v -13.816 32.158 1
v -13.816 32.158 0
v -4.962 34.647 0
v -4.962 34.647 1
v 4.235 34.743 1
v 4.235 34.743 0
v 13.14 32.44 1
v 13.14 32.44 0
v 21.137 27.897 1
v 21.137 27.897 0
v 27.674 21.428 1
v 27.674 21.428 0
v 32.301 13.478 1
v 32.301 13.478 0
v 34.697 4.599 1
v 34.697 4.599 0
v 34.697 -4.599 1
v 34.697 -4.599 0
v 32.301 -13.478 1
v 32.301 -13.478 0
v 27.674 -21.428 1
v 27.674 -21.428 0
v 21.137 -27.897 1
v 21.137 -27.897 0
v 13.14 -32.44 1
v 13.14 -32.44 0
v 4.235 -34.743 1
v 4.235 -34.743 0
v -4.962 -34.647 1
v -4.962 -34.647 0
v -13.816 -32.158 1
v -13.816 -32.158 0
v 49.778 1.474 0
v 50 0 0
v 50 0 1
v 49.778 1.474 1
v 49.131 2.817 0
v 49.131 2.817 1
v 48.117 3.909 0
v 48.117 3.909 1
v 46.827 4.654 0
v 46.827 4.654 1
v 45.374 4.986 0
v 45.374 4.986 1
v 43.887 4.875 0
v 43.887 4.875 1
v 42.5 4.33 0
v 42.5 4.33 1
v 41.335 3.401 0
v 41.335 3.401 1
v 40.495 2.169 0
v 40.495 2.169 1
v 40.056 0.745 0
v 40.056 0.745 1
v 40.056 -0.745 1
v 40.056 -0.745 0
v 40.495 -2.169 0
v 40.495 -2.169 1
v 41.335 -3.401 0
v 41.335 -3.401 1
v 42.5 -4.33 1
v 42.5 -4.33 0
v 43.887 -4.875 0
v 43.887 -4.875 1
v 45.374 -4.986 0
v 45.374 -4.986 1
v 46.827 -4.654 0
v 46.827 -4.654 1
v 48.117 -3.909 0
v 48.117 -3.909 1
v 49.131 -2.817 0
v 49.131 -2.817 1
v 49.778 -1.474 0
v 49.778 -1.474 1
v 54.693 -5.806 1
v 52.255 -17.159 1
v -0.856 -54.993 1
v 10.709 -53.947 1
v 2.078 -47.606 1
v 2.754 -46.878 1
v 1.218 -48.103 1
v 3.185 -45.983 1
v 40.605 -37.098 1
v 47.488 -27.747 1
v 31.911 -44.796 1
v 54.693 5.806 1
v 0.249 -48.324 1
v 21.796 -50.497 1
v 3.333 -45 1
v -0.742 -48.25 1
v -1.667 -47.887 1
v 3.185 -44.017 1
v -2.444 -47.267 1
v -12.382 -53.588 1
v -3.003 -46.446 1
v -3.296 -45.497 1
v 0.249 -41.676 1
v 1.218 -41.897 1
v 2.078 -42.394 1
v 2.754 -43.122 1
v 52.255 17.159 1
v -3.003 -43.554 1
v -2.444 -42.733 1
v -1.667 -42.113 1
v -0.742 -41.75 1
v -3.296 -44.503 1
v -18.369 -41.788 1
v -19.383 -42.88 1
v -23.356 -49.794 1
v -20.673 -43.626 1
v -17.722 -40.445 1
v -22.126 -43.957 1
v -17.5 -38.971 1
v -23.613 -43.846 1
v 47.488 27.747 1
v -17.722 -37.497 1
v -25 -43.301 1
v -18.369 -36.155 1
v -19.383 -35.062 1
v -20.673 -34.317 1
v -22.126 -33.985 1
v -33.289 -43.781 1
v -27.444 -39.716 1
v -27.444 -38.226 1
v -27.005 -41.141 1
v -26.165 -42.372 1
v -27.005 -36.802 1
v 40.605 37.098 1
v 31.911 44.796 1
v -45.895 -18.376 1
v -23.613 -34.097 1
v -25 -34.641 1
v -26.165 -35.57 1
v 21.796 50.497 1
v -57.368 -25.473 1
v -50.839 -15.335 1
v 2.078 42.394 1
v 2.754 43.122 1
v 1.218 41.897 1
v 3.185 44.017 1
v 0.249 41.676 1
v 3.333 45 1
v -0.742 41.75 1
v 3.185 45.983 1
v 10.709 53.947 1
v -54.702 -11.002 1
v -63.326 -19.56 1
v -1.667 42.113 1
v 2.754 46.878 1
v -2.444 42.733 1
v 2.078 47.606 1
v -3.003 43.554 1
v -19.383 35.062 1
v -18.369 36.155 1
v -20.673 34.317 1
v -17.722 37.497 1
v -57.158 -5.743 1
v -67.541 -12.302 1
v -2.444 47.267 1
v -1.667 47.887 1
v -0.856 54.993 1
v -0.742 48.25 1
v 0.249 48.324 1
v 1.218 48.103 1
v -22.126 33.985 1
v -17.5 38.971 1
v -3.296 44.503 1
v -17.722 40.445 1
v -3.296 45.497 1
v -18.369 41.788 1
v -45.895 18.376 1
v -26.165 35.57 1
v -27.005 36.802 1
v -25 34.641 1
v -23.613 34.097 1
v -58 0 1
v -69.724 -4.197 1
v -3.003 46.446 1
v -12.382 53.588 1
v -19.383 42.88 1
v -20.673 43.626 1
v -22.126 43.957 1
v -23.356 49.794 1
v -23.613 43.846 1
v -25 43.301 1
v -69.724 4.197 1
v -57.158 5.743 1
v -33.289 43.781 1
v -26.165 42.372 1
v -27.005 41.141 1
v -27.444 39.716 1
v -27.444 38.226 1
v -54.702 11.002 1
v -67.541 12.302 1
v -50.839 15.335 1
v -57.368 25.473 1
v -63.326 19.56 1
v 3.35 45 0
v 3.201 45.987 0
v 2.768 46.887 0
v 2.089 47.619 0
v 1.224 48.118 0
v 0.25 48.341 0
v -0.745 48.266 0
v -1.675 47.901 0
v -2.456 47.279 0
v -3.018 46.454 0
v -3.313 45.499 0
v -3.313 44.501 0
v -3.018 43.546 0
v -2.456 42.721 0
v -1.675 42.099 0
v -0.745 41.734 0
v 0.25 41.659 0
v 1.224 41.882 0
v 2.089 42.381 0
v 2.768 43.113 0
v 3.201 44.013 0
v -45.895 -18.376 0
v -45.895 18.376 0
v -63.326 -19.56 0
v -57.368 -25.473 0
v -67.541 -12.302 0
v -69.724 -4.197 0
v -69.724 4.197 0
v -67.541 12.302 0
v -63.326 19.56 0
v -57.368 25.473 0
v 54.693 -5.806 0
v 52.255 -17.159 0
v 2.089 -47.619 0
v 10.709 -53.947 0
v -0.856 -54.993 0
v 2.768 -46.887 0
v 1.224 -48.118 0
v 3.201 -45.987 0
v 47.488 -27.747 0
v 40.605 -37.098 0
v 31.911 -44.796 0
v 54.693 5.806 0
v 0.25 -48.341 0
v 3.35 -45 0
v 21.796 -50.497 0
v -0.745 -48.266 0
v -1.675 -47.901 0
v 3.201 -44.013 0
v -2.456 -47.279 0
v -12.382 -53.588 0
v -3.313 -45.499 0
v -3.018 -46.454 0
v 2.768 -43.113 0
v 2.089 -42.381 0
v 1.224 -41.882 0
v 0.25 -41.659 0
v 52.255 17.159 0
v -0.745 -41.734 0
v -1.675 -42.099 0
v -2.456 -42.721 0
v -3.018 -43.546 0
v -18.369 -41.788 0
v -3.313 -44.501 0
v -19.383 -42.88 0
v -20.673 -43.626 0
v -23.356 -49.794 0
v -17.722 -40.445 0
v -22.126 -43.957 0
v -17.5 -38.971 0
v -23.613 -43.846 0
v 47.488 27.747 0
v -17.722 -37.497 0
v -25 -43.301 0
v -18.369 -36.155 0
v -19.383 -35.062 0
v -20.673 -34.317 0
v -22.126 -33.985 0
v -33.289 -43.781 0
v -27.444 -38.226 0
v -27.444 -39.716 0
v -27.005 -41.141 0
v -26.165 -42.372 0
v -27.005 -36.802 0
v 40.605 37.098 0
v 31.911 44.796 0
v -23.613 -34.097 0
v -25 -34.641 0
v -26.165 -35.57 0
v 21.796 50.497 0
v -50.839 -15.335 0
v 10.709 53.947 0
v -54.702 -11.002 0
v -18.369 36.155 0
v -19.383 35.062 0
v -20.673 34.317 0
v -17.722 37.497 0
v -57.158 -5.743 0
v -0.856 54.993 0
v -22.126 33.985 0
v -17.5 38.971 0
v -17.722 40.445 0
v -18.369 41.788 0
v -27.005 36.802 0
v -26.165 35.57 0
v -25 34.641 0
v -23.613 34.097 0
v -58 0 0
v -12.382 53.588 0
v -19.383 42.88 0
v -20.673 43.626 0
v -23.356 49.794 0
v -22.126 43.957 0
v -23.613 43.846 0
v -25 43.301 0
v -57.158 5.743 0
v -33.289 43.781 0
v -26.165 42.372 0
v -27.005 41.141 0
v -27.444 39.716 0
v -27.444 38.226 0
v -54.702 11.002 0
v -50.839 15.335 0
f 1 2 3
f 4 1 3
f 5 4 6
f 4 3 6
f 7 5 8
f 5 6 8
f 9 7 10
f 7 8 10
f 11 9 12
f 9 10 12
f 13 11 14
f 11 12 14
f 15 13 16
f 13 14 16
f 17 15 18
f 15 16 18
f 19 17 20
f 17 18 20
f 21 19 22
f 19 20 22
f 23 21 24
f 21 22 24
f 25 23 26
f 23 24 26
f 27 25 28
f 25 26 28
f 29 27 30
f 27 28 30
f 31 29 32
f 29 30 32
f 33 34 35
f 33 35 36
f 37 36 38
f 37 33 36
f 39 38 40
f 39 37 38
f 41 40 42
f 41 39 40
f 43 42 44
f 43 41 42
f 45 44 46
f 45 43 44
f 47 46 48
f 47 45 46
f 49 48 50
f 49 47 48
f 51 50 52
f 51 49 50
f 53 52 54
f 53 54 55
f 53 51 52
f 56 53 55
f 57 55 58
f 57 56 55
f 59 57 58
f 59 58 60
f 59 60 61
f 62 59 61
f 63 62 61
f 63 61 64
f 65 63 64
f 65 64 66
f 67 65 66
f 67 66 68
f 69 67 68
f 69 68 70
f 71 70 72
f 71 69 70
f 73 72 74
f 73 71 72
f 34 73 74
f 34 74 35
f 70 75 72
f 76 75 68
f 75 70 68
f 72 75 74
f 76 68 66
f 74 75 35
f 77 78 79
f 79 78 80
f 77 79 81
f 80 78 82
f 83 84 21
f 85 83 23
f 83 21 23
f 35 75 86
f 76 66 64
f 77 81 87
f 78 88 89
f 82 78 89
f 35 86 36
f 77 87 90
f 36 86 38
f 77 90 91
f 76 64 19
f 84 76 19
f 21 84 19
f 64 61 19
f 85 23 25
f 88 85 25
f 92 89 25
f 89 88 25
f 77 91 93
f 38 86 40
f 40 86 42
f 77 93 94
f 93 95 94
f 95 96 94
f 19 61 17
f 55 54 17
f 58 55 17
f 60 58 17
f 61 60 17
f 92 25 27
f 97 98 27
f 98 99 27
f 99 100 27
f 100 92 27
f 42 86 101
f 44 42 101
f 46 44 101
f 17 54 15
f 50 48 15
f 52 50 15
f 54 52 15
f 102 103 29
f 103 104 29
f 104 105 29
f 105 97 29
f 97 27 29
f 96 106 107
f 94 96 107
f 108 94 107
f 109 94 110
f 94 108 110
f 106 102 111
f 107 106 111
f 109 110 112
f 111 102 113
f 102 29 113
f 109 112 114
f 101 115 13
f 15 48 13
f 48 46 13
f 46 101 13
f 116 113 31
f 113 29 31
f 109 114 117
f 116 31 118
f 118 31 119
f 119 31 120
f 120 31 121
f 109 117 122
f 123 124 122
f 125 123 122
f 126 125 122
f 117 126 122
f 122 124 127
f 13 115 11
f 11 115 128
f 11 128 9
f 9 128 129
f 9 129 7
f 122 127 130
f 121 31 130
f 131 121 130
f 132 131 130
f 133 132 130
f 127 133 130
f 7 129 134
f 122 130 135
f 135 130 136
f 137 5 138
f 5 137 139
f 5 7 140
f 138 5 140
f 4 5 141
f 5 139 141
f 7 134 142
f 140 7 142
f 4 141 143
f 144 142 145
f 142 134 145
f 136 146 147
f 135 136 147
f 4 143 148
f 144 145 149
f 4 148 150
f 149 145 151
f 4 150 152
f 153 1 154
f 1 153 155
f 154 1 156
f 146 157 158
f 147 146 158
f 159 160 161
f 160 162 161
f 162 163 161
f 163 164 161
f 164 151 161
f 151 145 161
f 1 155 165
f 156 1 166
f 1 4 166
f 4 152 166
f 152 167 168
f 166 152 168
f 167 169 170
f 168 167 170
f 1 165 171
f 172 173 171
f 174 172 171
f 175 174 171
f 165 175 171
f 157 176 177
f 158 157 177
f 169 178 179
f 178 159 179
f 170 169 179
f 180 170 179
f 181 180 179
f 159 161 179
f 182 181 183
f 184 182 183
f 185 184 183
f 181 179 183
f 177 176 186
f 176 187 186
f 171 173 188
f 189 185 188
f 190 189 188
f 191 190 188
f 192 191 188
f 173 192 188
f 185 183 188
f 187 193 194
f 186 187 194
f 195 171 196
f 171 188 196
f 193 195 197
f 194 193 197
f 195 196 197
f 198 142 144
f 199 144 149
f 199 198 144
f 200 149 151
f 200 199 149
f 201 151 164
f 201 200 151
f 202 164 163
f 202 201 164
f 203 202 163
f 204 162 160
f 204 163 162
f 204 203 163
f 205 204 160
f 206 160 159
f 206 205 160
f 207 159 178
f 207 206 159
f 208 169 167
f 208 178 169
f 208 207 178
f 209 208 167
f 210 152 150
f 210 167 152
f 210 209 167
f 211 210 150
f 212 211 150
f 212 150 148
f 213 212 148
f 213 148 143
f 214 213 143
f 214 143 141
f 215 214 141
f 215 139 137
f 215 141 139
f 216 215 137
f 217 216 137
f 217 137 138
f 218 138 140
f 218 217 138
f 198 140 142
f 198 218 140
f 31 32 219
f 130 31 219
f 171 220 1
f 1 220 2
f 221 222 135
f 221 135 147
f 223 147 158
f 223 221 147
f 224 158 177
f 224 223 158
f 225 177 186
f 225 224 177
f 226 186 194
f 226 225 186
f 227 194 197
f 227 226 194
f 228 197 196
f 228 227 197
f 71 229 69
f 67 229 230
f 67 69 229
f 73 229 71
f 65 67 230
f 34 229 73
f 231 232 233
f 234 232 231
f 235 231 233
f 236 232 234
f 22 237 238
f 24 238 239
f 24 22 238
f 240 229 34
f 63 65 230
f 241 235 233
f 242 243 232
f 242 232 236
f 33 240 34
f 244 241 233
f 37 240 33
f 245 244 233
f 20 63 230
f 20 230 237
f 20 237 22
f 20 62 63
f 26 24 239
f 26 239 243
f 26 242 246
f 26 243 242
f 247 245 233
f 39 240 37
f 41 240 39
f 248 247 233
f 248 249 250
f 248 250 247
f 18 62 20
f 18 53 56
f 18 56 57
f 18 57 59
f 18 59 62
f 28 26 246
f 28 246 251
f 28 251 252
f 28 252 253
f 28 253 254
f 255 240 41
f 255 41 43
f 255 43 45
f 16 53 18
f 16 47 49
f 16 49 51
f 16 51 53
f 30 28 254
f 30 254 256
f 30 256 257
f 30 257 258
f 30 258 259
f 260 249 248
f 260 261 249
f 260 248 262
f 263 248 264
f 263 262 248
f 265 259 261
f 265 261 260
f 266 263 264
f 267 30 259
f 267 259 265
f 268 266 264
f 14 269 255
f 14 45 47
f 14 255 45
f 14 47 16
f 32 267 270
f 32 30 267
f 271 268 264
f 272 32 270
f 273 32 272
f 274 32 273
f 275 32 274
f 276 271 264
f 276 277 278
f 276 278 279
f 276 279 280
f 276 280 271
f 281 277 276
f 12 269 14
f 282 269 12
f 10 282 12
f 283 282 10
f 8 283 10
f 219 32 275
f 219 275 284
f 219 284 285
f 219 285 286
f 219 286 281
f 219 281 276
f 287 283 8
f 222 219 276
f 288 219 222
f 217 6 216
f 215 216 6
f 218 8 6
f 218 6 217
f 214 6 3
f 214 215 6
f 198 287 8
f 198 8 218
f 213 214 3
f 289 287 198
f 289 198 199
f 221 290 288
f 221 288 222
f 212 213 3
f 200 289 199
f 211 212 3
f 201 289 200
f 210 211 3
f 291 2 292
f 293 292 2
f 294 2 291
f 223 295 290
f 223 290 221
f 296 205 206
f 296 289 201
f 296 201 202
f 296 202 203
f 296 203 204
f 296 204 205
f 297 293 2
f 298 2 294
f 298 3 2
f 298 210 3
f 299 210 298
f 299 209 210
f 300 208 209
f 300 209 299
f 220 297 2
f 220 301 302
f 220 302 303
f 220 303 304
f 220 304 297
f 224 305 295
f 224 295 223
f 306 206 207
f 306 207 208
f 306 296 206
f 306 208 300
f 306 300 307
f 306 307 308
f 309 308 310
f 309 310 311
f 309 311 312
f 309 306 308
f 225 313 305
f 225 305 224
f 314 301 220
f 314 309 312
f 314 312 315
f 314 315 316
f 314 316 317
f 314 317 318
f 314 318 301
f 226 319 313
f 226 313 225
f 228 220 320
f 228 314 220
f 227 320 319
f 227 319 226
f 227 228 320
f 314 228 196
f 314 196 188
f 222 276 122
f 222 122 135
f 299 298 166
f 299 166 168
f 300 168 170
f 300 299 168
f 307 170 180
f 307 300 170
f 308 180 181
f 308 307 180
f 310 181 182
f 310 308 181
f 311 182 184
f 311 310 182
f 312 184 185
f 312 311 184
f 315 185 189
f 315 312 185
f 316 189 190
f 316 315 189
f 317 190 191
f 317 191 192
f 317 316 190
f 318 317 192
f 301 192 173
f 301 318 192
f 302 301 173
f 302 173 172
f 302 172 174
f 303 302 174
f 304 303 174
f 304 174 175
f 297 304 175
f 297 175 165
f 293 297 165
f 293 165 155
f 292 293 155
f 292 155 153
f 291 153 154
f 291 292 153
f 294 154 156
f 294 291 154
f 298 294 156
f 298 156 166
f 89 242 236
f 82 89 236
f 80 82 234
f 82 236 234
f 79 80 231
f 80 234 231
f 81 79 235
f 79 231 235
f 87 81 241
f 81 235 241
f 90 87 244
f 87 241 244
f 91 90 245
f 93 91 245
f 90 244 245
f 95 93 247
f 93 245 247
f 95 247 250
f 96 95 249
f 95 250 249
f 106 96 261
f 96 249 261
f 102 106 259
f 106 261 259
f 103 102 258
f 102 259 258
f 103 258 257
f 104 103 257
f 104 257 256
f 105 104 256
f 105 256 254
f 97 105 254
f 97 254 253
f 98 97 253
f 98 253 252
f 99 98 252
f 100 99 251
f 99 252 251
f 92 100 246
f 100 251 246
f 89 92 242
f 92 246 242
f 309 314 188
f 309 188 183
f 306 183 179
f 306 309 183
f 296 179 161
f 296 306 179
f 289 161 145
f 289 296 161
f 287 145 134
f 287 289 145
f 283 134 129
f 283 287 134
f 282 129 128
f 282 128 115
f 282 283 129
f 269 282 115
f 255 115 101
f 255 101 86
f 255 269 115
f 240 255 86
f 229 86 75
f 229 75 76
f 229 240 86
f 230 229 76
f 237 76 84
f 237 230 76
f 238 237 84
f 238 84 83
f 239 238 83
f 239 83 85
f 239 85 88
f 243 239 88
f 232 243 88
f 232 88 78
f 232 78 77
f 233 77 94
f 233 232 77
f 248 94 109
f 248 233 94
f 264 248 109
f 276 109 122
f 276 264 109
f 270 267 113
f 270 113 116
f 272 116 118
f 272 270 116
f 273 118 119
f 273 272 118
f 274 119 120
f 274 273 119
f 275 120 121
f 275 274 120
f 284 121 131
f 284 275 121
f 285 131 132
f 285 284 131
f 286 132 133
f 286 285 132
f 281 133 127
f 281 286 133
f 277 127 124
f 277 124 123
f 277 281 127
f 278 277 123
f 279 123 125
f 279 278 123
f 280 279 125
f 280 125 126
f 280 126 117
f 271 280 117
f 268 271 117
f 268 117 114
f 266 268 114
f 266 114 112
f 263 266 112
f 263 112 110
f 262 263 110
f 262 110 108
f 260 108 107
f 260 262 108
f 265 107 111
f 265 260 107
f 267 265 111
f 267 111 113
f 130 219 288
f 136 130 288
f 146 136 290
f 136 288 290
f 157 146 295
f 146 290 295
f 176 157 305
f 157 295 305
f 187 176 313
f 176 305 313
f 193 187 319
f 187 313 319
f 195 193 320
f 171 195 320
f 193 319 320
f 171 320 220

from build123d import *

# Parameters (mm, degrees)
SKETCH_1_R      = 5
EXTRUDE_1_DEPTH = 1
SKETCH_3_R      = 3
SKETCH_2_R      = 3.75


with BuildPart() as part:
    # Эскиз1 → Бобышка-Вытянуть1 (new body)
    with BuildSketch(Plane.XY):
        with BuildLine():
            Line((-57.368421028, 25.472814244), (-33.289473642, 43.781399484))
            ThreePointArc((-33.289473642, 43.781399484), (54.999999965, 0), (-33.289473642, -43.781399484))
            Line((-33.289473642, -43.781399484), (-57.368421028, -25.472814244))
            ThreePointArc((-57.368421028, -25.472814244), (-69.999999979, 0), (-57.368421028, 25.472814244))
        make_face()
        with Locations((-22.5, 38.97114317)):
            Circle(SKETCH_1_R, mode=Mode.SUBTRACT)
        with Locations((45, 0)):
            Circle(SKETCH_1_R, mode=Mode.SUBTRACT)
        with Locations((-22.5, -38.97114317)):
            Circle(SKETCH_1_R, mode=Mode.SUBTRACT)
        with BuildLine():
            Line((-45.894736842, 18.375884474), (-13.815789474, 32.157797829))
            ThreePointArc((-13.815789474, 32.157797829), (35, 0), (-13.815789474, -32.157797829))
            Line((-13.815789474, -32.157797829), (-45.894736842, -18.375884474))
            ThreePointArc((-45.894736842, -18.375884474), (-58, 0), (-45.894736842, 18.375884474))
        make_face(mode=Mode.SUBTRACT)
    extrude(amount=EXTRUDE_1_DEPTH)

    # Эскиз3 → Вырез-По сечениям1 section 0
    with BuildSketch(Plane.XY.offset(21)):
        with Locations((0, 45)):
            Circle(SKETCH_3_R)
    # Эскиз2 → Вырез-По сечениям1 section 1
    with BuildSketch(Plane(origin=(0, 0, -24), x_dir=(-1, 0, 0), z_dir=(0, 0, -1))):
        with Locations((0, 45)):
            Circle(SKETCH_2_R)
    loft_1 = loft(mode=Mode.SUBTRACT)

    # Зеркальное отражение1: Вырез-По сечениям1 across plane
    add(loft_1.mirror(Plane.ZX), mode=Mode.SUBTRACT)


solid = part.part
